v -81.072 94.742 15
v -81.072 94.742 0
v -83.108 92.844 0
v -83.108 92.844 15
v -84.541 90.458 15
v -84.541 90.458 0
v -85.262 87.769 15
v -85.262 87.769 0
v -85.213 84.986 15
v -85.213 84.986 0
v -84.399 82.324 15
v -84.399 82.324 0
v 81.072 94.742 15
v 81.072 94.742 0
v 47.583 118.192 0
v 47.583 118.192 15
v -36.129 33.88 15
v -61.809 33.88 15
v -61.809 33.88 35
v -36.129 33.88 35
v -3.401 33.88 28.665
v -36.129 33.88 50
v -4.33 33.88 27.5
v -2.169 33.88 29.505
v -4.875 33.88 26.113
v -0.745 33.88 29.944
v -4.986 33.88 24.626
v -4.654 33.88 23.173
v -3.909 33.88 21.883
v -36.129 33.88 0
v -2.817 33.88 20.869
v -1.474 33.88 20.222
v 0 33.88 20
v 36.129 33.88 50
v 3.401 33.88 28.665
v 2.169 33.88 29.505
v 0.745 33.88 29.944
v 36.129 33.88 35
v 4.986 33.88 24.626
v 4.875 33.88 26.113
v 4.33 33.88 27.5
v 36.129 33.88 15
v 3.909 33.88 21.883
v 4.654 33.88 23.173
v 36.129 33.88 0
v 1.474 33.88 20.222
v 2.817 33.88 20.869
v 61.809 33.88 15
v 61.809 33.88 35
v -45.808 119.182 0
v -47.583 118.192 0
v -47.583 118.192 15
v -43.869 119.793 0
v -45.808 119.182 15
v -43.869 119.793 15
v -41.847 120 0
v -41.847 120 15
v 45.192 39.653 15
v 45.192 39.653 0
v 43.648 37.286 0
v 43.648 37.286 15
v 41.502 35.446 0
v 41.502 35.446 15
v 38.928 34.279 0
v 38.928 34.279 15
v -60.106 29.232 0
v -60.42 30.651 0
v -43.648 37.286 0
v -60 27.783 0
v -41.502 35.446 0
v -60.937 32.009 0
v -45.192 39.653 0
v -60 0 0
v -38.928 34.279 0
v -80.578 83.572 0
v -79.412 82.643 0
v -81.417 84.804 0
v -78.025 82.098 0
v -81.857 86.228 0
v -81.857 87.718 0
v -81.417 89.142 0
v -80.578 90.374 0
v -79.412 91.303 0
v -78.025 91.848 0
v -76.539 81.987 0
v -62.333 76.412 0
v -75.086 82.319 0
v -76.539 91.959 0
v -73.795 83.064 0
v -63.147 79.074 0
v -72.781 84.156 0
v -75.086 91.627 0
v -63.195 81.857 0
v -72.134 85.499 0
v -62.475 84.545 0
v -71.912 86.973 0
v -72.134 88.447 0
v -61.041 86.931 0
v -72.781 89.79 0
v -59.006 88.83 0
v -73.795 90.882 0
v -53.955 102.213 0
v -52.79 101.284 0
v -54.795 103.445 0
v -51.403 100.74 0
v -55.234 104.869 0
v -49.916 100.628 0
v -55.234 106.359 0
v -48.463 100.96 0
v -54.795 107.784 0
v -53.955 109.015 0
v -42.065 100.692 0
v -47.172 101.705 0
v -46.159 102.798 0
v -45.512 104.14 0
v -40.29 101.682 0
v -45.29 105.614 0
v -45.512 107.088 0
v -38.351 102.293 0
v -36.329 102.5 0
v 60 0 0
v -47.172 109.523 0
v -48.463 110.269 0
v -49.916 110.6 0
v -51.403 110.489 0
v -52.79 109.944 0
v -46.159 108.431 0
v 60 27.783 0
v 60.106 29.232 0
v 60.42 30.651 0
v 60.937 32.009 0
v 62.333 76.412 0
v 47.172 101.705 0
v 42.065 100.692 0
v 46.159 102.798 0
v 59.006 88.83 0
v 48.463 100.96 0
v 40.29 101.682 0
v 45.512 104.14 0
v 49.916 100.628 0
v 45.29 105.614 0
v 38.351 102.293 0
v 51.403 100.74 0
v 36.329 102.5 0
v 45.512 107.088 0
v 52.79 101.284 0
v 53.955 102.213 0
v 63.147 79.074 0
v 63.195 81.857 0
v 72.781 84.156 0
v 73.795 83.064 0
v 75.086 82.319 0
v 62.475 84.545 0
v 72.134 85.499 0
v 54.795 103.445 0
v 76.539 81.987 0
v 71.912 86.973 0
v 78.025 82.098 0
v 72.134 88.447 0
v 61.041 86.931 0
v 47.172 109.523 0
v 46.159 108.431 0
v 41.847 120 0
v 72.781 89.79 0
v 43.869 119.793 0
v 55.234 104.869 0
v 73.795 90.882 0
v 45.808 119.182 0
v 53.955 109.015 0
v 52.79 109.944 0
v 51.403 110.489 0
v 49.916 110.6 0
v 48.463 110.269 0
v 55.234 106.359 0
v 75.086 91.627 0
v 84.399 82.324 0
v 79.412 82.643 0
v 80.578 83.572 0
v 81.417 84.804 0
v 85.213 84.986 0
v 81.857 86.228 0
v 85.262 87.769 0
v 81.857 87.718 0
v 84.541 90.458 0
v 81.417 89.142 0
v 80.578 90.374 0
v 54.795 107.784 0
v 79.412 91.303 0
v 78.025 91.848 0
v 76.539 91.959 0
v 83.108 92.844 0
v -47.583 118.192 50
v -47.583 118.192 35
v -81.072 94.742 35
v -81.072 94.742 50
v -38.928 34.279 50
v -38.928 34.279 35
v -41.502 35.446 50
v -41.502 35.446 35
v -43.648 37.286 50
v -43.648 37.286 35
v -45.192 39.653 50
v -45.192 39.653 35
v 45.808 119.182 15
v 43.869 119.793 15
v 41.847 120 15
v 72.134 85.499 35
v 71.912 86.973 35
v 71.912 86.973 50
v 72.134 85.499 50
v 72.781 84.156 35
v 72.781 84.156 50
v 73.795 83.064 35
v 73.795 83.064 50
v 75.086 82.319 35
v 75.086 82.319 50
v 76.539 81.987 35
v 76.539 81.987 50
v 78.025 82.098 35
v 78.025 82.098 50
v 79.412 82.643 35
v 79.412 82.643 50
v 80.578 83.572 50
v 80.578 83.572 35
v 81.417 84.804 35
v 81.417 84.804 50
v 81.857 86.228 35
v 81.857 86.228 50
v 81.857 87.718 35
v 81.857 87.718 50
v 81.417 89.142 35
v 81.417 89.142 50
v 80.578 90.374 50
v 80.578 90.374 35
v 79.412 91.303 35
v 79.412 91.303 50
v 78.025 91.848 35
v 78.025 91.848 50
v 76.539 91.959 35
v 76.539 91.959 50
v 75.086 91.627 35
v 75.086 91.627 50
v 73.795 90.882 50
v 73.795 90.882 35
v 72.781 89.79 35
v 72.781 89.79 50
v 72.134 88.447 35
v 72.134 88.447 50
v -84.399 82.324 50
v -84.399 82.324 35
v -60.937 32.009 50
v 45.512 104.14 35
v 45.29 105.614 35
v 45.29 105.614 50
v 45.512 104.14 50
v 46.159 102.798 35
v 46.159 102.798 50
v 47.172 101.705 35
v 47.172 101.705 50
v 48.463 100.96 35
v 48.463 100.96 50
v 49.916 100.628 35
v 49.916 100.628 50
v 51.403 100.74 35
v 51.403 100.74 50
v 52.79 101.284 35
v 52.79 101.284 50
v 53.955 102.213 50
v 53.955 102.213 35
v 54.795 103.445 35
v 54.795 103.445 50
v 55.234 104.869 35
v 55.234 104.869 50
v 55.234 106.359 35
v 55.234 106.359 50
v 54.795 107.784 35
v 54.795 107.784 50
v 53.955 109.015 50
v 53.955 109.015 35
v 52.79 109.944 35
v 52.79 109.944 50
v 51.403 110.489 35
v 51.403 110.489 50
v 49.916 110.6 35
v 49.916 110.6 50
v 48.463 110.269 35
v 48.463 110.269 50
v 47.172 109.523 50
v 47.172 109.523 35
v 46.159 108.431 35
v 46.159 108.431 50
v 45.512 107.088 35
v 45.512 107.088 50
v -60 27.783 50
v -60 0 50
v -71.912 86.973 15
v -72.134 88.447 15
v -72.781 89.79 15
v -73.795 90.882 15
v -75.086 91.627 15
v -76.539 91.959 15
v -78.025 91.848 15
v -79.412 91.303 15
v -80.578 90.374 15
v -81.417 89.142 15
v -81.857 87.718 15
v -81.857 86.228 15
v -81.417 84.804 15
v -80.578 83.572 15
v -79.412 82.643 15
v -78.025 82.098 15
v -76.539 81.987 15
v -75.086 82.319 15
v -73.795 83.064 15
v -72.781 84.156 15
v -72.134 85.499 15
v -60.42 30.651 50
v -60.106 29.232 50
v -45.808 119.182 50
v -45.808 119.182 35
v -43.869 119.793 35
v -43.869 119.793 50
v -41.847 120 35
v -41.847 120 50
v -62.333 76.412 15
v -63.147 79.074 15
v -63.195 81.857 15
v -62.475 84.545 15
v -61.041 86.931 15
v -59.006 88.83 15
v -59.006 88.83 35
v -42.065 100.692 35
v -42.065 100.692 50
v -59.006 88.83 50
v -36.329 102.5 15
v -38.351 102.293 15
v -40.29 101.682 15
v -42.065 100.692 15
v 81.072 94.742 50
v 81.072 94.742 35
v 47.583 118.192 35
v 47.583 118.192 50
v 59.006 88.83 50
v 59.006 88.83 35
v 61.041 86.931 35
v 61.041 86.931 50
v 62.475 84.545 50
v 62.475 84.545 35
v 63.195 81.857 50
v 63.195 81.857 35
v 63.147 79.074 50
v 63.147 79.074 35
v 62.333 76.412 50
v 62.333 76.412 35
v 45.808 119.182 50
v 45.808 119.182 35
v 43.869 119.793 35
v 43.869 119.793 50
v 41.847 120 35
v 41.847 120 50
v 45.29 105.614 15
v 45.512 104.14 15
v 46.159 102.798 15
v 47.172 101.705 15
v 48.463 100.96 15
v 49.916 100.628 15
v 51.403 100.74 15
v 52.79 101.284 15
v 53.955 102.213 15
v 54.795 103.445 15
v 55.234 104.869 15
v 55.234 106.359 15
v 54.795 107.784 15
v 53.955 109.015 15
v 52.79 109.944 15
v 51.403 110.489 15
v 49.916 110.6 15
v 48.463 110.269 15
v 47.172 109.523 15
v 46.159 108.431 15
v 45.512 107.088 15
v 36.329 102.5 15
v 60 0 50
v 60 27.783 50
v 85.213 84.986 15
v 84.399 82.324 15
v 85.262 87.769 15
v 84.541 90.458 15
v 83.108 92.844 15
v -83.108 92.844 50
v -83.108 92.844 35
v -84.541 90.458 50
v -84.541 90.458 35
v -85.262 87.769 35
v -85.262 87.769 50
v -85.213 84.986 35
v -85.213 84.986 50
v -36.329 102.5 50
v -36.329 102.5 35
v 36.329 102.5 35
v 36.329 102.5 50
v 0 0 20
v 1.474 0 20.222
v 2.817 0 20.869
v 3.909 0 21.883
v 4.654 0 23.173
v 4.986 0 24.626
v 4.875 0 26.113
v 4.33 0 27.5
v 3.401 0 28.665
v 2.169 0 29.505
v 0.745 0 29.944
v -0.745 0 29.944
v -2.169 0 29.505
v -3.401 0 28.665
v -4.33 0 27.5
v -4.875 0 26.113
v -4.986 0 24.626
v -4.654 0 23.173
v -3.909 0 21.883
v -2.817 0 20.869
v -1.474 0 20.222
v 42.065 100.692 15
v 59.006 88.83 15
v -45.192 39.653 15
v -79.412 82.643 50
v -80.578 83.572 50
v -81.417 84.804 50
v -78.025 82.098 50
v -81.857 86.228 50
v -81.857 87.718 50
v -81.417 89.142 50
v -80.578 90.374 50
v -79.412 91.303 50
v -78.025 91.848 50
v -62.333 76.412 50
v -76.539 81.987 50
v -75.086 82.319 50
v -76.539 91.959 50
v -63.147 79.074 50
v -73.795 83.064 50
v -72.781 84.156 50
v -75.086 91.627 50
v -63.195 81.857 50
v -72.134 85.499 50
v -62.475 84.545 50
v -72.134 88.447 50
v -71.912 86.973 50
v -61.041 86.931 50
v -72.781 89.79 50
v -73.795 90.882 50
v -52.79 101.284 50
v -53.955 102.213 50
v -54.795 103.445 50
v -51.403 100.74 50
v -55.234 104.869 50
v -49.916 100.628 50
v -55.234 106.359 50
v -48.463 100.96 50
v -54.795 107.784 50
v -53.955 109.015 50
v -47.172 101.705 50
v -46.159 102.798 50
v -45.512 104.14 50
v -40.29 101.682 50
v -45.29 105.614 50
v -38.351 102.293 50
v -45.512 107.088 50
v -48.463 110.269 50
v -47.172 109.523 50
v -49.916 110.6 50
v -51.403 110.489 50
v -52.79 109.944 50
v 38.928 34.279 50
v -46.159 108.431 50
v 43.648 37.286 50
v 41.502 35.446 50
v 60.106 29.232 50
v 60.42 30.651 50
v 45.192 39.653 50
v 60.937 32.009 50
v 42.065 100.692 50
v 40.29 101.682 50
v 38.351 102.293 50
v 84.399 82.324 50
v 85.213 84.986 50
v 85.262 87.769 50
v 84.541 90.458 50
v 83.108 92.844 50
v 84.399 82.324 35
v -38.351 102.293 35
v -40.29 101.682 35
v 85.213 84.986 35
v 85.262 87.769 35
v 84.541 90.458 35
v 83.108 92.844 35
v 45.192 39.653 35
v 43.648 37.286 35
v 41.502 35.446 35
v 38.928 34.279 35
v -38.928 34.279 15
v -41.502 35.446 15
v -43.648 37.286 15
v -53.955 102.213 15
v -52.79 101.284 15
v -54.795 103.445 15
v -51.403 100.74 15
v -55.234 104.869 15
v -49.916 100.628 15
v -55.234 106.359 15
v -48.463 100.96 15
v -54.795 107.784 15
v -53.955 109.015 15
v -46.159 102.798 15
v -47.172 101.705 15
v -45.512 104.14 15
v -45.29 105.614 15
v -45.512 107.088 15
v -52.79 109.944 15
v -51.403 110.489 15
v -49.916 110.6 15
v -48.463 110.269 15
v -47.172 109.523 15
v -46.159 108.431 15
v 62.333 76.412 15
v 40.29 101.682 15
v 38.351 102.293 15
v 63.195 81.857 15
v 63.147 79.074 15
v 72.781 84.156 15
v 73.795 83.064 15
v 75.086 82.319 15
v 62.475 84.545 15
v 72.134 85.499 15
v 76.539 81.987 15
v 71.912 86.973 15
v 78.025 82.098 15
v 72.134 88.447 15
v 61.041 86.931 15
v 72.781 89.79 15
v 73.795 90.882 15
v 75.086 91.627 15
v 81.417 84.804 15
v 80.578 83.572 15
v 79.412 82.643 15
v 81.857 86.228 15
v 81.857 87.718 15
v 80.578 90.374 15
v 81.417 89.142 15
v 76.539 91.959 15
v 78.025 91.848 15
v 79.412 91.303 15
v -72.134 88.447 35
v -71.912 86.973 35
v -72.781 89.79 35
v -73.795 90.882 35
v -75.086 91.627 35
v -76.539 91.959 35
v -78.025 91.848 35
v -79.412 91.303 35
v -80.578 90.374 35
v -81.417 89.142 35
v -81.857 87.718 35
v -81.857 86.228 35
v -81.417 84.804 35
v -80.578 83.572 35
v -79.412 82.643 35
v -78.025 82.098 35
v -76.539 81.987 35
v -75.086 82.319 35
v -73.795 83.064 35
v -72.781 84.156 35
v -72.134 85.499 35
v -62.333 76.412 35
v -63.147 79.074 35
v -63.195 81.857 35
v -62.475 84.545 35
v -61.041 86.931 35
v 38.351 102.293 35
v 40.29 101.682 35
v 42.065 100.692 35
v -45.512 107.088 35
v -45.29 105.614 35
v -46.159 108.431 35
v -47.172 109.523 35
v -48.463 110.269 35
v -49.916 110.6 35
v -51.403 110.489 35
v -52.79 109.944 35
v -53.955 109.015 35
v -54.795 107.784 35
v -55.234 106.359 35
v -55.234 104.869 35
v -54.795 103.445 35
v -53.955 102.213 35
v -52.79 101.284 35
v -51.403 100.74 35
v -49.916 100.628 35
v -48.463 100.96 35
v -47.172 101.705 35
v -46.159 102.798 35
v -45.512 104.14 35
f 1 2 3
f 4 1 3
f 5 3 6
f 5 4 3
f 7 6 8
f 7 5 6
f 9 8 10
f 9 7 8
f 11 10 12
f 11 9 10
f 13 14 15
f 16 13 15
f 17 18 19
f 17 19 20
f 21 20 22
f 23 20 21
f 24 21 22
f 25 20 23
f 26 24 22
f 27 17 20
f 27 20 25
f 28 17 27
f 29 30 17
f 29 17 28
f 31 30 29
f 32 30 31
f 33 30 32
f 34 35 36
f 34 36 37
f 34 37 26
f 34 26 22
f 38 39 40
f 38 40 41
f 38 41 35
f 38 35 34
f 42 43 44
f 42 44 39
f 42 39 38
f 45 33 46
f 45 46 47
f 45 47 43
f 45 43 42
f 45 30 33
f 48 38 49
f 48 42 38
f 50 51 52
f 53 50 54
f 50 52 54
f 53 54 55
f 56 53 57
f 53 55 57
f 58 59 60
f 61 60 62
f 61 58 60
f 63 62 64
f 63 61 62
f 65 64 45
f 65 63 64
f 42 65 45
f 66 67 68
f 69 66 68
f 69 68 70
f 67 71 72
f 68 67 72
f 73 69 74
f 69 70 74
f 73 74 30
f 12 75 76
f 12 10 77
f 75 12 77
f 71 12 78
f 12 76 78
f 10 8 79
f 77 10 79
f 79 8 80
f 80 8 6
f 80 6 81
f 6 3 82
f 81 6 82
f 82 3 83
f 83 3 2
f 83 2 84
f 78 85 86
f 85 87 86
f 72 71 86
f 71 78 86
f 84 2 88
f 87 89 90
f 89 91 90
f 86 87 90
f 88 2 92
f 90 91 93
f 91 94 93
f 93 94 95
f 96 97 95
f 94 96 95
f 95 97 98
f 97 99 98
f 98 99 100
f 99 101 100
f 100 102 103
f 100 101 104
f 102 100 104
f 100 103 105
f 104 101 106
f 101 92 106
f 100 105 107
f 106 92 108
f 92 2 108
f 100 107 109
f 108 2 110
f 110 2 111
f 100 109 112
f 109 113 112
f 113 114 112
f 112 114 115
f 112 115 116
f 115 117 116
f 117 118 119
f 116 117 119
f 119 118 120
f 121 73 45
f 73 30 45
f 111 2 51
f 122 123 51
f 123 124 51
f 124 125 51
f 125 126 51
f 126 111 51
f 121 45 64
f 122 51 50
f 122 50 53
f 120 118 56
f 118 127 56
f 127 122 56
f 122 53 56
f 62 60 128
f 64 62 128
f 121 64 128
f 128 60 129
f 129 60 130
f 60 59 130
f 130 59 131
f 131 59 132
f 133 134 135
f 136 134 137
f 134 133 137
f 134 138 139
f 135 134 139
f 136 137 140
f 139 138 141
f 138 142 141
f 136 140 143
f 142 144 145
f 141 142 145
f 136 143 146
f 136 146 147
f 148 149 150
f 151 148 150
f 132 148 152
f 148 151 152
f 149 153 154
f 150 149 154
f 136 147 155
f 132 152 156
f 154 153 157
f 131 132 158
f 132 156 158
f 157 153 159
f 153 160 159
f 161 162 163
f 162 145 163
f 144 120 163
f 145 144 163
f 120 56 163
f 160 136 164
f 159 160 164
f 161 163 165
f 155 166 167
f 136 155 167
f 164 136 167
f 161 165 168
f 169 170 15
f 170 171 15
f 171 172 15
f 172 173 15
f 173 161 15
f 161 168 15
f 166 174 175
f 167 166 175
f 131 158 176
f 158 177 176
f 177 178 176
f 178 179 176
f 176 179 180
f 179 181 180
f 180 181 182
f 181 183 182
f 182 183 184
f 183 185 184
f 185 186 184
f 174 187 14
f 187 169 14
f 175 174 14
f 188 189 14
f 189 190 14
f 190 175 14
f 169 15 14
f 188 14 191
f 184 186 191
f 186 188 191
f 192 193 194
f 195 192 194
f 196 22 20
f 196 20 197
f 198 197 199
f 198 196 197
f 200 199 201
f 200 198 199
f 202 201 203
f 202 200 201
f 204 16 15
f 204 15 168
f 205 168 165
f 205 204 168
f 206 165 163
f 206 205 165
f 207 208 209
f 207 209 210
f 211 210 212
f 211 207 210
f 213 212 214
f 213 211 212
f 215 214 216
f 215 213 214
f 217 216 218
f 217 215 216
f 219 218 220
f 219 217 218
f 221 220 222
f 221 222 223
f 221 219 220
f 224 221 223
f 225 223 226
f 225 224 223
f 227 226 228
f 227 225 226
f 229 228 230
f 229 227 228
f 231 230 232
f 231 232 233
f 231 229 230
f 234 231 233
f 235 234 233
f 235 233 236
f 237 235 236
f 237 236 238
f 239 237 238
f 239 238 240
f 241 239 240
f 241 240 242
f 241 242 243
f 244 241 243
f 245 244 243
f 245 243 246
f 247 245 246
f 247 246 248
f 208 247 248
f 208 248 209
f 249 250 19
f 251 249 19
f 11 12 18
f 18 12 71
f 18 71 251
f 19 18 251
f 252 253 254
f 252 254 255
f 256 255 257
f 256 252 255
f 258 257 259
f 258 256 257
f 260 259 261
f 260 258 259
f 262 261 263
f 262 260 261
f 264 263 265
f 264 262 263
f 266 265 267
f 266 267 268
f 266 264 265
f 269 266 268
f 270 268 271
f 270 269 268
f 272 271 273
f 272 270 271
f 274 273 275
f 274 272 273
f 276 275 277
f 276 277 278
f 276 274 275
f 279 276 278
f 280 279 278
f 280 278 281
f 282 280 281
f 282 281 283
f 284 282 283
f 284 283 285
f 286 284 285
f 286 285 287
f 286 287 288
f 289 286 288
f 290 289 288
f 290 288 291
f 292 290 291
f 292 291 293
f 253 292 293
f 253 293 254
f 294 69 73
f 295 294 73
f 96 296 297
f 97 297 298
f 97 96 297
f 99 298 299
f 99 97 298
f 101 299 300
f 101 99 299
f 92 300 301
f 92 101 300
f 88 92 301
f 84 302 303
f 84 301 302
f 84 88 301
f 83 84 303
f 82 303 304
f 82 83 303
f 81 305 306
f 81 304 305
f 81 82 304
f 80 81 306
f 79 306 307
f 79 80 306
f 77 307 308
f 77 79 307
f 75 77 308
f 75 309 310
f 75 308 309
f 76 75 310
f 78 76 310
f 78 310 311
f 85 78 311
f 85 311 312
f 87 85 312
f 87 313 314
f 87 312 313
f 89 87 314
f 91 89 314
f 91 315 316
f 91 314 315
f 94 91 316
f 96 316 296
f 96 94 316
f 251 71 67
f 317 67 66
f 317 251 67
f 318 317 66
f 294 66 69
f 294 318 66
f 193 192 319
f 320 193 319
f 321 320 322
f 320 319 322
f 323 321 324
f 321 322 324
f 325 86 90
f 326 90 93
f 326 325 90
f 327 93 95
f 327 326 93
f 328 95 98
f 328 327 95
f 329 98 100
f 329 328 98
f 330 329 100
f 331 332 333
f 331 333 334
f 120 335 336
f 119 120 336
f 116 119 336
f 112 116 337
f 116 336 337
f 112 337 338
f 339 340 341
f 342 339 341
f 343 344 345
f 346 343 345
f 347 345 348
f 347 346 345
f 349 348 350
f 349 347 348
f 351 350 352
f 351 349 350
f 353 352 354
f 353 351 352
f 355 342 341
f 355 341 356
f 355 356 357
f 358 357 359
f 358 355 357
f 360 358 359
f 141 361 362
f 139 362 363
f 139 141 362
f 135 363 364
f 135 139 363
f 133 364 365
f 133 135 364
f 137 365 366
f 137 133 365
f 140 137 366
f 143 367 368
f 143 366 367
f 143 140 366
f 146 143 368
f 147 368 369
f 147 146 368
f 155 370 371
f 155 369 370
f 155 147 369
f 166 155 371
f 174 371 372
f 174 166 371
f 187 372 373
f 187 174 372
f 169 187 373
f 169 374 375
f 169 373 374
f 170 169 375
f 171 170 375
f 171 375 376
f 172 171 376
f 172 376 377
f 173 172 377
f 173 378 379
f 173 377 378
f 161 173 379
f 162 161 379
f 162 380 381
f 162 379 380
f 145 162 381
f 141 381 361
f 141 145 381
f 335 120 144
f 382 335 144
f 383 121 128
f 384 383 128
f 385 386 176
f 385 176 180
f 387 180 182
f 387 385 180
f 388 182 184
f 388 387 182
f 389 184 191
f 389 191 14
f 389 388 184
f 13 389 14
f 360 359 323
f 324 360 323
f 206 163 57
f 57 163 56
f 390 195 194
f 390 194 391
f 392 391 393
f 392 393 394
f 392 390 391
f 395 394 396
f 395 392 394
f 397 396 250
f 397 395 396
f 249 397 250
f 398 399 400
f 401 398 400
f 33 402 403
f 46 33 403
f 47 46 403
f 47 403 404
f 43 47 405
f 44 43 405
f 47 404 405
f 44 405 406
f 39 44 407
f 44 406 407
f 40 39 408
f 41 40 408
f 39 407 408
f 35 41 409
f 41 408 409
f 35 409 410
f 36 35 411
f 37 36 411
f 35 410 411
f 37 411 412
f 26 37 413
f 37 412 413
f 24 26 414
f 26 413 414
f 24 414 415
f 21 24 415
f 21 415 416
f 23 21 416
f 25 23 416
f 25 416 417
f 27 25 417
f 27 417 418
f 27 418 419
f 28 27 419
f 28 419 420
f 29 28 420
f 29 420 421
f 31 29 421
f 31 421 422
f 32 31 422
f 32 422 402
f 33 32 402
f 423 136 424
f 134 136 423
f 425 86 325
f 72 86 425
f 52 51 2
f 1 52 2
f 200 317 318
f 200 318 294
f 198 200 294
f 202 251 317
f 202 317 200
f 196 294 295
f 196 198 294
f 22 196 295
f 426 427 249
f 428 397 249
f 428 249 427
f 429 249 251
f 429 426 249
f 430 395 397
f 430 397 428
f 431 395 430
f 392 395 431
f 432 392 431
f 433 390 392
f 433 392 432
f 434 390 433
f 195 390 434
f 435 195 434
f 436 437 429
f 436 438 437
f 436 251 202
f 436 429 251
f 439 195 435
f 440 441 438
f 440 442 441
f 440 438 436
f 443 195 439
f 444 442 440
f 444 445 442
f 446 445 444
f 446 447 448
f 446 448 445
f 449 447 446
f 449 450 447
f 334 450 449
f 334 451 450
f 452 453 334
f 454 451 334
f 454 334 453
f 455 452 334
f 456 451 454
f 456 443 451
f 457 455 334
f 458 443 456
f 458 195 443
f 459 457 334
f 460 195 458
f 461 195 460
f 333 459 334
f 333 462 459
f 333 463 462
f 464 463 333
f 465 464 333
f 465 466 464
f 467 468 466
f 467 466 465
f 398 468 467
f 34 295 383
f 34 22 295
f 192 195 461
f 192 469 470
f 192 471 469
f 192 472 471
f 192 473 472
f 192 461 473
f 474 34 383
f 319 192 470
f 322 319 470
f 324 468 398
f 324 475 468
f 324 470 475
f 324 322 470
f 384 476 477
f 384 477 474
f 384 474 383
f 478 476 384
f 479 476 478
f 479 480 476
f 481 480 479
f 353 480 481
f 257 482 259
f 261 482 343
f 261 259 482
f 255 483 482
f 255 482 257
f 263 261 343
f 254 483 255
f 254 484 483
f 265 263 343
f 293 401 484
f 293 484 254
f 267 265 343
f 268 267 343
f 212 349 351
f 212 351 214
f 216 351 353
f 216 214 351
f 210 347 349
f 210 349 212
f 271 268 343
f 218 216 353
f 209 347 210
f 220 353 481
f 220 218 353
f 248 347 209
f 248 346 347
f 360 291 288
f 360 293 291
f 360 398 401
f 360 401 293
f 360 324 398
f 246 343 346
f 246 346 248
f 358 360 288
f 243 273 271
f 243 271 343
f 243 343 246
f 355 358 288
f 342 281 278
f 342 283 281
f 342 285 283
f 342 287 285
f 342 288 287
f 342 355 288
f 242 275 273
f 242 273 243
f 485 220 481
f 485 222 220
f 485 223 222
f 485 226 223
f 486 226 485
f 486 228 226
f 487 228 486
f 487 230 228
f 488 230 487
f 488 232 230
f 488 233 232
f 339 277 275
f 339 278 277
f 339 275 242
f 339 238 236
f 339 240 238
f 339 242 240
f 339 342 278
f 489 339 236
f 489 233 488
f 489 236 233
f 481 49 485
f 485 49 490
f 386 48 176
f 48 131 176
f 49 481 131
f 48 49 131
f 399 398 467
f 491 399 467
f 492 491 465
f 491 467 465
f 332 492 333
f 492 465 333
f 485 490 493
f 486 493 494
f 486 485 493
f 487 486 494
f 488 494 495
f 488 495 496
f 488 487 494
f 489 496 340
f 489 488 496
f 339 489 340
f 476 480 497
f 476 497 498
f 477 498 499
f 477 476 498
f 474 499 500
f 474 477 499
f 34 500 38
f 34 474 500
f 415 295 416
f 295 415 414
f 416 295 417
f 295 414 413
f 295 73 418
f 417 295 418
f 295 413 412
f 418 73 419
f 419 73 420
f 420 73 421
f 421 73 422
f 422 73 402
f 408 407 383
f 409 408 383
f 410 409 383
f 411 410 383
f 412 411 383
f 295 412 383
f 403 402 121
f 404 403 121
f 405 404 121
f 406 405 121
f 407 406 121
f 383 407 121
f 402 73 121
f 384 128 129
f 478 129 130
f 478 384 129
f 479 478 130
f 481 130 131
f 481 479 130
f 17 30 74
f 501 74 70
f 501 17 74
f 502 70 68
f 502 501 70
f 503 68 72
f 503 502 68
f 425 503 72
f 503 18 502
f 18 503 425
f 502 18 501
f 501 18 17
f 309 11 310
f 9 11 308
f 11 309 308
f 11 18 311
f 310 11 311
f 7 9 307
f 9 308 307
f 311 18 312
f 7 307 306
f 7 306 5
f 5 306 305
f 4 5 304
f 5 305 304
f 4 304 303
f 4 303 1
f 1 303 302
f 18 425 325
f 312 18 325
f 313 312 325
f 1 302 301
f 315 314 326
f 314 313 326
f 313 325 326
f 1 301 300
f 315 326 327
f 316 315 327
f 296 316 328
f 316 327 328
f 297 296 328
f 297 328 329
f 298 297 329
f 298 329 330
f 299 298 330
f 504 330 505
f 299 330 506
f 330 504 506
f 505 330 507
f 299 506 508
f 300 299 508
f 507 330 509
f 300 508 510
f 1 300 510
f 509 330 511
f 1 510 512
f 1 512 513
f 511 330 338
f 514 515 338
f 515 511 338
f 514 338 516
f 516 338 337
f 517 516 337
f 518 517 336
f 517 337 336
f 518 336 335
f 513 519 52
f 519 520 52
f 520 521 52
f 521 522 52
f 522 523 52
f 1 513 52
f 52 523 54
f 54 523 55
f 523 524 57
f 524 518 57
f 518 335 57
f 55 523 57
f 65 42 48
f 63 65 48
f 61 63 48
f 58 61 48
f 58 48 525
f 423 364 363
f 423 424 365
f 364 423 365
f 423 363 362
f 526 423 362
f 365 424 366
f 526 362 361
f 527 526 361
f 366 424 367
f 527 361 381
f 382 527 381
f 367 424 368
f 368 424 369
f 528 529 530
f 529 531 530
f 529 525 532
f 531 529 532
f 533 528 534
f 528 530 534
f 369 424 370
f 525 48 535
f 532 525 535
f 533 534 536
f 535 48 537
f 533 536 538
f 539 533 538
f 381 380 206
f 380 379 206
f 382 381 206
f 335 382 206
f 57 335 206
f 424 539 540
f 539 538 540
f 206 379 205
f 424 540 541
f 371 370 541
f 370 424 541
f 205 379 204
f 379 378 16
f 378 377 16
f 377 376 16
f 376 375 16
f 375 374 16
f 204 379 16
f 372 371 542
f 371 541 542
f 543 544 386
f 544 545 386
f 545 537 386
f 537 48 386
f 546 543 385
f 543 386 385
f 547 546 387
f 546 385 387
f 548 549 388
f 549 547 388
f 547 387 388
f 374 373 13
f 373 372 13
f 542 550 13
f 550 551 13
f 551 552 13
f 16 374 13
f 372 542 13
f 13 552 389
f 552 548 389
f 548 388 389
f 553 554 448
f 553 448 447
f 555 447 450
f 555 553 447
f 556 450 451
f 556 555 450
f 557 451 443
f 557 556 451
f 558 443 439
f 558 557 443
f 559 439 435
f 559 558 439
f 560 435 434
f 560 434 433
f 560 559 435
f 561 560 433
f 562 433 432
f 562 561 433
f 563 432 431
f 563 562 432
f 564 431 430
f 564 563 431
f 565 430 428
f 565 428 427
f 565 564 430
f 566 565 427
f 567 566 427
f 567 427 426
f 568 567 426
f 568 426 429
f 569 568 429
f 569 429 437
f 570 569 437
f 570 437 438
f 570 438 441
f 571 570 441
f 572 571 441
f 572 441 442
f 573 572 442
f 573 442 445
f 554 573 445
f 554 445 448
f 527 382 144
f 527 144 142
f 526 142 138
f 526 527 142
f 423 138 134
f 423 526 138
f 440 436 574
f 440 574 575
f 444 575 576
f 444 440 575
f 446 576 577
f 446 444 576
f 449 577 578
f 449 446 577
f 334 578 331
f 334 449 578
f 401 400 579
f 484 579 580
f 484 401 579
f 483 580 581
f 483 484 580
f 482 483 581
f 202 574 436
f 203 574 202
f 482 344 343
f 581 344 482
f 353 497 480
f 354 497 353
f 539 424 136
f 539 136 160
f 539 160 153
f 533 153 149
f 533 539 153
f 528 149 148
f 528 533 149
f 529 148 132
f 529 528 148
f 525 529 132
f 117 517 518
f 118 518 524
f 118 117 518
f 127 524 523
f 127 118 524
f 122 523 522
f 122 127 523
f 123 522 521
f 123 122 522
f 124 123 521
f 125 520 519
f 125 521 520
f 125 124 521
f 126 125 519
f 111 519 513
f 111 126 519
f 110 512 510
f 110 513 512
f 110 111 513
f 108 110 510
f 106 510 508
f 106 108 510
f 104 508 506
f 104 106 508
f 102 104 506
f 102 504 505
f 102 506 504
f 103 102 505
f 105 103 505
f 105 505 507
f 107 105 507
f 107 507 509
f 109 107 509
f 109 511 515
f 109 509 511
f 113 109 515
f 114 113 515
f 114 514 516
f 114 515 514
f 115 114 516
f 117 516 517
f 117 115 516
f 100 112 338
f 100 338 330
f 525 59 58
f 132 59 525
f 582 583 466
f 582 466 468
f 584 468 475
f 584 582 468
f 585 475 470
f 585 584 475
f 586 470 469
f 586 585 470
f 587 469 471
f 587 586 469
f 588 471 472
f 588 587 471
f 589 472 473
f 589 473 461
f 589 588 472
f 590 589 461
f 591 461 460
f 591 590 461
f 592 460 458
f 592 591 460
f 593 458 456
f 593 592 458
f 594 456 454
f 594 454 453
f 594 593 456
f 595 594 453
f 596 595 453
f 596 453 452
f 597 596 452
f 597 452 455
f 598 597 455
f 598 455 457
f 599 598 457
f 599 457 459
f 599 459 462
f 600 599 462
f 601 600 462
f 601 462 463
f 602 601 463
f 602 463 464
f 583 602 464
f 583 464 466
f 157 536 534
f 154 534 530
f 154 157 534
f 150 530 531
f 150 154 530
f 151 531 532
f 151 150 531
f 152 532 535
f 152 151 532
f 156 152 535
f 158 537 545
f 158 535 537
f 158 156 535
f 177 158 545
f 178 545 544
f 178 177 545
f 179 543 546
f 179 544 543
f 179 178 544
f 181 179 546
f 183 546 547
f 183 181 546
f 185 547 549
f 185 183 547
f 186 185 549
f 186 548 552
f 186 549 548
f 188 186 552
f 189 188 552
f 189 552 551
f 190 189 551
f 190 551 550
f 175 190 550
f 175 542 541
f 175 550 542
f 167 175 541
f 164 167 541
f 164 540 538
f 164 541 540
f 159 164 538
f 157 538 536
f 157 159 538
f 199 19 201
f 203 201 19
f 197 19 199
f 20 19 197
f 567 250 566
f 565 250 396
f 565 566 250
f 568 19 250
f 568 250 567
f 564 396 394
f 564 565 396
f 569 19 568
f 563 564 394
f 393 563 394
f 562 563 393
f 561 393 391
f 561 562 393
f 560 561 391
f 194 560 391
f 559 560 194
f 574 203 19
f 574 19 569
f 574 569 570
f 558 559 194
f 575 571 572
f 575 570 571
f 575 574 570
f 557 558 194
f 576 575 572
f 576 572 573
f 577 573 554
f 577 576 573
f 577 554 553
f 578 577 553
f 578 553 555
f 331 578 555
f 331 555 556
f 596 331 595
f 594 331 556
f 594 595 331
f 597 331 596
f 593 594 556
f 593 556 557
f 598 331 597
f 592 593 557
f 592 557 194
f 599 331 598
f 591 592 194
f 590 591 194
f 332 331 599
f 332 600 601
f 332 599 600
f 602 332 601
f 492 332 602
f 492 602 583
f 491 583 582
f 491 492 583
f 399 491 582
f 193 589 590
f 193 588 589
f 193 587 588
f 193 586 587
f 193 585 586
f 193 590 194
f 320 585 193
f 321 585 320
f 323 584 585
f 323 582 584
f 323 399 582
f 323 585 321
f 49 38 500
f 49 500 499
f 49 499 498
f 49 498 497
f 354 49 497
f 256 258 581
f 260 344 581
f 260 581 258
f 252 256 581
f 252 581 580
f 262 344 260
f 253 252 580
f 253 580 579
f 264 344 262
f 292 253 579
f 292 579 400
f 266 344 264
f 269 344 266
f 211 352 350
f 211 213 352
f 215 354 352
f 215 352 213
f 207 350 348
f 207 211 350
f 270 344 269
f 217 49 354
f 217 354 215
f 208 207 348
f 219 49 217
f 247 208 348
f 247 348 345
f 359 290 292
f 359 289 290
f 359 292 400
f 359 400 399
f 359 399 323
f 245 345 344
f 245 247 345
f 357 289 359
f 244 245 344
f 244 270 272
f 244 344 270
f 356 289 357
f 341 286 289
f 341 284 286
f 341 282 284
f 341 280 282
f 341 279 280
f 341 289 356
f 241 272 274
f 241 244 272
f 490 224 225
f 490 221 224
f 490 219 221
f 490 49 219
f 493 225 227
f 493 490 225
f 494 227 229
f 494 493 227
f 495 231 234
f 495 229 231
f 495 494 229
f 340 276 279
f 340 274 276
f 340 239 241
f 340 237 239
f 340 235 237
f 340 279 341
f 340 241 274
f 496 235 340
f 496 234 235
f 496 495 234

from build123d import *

# Parameters (mm, degrees)
SKETCH2_R               = 5
BOSS_EXTRUDE2_DEPTH     = 50
FILLET1_R               = 10
CUT_EXTRUDE1_DEPTH      = 195.993878356
CUT_EXTRUDE1_DEPTH_BACK = 195.993878356
SKETCH3_W               = 20
SKETCH3_H               = 86.120343404
SKETCH4_R               = 5
CUT_EXTRUDE2_DEPTH      = 156.50648845


with BuildPart() as part:
    # Sketch2 → Boss-Extrude2 (new body)
    with BuildSketch(Plane.XY):
        Polygon((0, 120), (-45, 120), (-87.945471533, 89.9292571), (-60, 30), (-60, 0), (0, 0), (60, 0), (60, 30), (87.945471533, 89.9292571), (45, 120), align=None)
        with Locations((-50.289922216, 105.614178936)):
            Circle(SKETCH2_R, mode=Mode.SUBTRACT)
        with Locations((-76.912363656, 86.972944754)):
            Circle(SKETCH2_R, mode=Mode.SUBTRACT)
        with Locations(Location((76.912363656, 86.972944754, 0), (0, 0, 180))):
            Circle(SKETCH2_R, mode=Mode.SUBTRACT)
        with Locations(Location((50.289922216, 105.614178936, 0), (0, 0, 180))):
            Circle(SKETCH2_R, mode=Mode.SUBTRACT)
        Polygon((0, 102.5), (-39.482271195, 102.5), (-65.879255778, 84.016632409), (-42.5, 33.879656596), (42.5, 33.879656596), (65.879255778, 84.016632409), (39.482271195, 102.5), align=None, mode=Mode.SUBTRACT)
    extrude(amount=BOSS_EXTRUDE2_DEPTH)

    # Fillet1
    fillet1_edges = [part.edges().sort_by_distance(p)[0] for p in [
        (-45, 120, 25),
        (45, 120, 25),
        (87.945471533, 89.9292571, 25),
        (60, 30, 25),
        (-60, 30, 25),
        (-87.945471533, 89.9292571, 25),
        (65.879255778, 84.016632409, 25),
        (39.482271195, 102.5, 25),
        (-39.482271195, 102.5, 25),
        (-65.879255778, 84.016632409, 25),
        (-42.5, 33.879656596, 25),
        (42.5, 33.879656596, 25),
    ]]
    fillet(fillet1_edges, radius=FILLET1_R)

    # Sketch3 → Cut-Extrude1 (cut, two sides: drawn at the far end of the back side and taken through both)
    with BuildSketch(Plane.ZY.offset(60).offset(-CUT_EXTRUDE1_DEPTH_BACK)):
        with Locations((25, 76.939828298)):
            Rectangle(SKETCH3_W, SKETCH3_H)
    extrude(amount=CUT_EXTRUDE1_DEPTH + CUT_EXTRUDE1_DEPTH_BACK, mode=Mode.SUBTRACT)

    # Sketch4 → Cut-Extrude2 (cut, through all)
    with BuildSketch(Plane.XZ):
        with Locations(Location((0, 25, 0), (0, 0, 270))):
            Circle(SKETCH4_R)
    extrude(amount=-CUT_EXTRUDE2_DEPTH, mode=Mode.SUBTRACT)


solid = part.part
